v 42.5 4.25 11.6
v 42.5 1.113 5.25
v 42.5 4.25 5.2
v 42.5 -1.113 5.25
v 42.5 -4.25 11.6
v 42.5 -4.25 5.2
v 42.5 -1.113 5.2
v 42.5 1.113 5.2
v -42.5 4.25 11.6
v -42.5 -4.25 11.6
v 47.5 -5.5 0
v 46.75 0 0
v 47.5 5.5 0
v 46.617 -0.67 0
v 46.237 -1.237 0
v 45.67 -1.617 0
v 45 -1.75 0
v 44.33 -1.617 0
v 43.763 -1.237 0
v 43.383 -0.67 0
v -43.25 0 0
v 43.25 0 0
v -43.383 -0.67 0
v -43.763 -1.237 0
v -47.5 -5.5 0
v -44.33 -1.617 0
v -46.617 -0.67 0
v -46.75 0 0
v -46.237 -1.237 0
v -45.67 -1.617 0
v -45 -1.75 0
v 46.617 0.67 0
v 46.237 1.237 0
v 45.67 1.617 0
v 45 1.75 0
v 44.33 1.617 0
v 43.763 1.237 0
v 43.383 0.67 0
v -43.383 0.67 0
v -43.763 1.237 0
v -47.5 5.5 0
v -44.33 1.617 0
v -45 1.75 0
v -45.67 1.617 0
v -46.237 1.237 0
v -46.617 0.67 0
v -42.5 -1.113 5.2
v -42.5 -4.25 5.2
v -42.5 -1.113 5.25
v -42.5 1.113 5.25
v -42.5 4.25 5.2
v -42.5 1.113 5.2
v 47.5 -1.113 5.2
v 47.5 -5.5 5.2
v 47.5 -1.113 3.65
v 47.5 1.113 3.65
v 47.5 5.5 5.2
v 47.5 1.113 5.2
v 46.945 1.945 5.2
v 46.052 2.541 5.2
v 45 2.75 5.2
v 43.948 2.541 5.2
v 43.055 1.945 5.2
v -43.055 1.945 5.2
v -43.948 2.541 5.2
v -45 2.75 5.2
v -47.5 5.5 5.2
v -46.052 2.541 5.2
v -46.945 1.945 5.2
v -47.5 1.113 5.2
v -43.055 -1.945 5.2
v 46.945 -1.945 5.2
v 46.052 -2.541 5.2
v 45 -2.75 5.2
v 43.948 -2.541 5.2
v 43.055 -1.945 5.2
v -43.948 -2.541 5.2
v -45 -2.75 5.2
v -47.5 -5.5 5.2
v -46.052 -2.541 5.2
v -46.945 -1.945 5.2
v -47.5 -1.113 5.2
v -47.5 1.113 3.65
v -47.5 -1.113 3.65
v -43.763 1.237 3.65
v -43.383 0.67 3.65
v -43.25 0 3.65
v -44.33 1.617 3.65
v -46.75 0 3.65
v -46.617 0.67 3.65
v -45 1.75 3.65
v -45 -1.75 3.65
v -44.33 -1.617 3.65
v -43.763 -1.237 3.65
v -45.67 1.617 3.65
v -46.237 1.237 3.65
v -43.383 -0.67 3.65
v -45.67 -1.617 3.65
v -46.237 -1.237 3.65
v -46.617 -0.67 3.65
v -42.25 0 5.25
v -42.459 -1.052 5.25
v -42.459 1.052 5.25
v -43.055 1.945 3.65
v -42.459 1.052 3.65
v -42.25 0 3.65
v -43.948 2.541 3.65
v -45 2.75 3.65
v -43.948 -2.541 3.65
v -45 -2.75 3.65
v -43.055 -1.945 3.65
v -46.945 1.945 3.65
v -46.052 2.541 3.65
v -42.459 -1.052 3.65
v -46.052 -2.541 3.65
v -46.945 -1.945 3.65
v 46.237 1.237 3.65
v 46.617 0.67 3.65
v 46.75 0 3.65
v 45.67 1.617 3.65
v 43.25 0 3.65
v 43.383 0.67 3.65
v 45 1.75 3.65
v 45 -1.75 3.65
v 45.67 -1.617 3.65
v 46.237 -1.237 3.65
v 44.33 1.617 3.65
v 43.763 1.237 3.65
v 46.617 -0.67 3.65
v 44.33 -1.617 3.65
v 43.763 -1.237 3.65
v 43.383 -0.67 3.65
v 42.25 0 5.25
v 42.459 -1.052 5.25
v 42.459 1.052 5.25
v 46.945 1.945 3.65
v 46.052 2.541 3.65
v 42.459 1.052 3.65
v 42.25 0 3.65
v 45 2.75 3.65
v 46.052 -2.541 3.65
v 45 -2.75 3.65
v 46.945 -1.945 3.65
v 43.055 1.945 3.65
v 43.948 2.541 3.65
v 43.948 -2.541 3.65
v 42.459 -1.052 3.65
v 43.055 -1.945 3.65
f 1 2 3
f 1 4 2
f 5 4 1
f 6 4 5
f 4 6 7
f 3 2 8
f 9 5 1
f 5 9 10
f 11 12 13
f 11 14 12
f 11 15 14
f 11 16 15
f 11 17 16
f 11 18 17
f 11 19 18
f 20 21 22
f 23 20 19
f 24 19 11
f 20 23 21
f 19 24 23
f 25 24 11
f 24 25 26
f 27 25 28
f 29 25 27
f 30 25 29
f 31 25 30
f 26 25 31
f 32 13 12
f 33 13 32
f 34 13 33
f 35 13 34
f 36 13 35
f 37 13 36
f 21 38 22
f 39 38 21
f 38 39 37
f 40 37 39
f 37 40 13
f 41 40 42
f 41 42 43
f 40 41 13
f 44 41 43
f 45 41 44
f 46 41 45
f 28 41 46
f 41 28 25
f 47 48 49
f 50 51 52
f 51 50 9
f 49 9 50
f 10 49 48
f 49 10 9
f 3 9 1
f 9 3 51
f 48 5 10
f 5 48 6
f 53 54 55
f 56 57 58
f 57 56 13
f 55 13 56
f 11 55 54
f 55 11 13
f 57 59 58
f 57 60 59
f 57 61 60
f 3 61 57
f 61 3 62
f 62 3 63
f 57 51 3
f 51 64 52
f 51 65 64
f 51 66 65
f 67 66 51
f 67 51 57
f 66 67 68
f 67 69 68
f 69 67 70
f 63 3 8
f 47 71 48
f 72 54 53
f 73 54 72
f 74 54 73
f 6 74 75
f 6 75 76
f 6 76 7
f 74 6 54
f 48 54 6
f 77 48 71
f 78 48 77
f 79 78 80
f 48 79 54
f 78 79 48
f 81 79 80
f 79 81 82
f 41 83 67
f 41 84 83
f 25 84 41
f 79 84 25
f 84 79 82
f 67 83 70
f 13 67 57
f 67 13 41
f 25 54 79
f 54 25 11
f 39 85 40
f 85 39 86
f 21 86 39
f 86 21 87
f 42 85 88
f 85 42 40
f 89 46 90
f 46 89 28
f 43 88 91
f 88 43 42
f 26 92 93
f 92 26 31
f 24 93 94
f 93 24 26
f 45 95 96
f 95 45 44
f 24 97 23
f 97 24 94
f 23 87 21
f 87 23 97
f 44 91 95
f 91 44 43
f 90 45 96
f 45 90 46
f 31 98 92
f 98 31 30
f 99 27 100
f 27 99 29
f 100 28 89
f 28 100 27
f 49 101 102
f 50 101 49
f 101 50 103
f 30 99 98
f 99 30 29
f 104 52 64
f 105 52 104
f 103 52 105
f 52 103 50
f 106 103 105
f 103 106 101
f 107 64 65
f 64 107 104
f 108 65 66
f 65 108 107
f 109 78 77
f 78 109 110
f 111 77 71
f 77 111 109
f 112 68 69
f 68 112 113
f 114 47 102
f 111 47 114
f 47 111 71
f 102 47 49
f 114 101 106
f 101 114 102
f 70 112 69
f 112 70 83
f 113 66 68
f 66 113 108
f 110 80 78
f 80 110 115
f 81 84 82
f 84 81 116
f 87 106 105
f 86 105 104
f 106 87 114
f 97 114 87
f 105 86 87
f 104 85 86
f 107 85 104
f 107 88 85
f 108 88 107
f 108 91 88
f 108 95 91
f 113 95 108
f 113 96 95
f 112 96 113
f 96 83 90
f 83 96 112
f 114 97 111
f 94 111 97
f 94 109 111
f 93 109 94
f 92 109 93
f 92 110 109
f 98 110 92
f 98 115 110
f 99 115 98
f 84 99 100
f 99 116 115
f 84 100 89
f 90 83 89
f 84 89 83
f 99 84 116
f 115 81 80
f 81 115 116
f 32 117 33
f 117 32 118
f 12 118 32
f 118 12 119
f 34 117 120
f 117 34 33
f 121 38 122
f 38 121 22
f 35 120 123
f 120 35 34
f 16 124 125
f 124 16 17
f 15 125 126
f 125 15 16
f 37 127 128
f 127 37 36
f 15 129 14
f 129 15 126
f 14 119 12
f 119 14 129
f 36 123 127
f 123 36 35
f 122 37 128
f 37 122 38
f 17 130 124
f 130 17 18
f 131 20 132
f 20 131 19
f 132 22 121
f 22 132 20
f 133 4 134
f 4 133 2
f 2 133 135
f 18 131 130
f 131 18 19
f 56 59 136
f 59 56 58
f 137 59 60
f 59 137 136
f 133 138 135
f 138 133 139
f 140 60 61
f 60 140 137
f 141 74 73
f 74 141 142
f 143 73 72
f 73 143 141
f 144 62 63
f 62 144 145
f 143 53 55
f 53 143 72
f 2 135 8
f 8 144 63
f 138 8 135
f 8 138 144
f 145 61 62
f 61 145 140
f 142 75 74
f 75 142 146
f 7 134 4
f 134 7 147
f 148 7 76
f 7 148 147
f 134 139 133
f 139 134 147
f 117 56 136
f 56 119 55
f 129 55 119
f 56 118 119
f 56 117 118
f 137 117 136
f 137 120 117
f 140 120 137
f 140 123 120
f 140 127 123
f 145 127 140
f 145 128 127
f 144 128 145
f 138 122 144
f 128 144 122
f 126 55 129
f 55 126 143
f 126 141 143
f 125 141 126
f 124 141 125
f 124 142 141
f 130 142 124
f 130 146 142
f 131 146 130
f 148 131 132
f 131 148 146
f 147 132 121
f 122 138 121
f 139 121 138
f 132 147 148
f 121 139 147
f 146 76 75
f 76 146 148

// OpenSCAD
// file: ../linurs/linurs_screw_dim.scad
// Metric screws and nuts 
// urs@linurs.org

// contains dimensions of linurs_screw and can be included in other 
// OpenScad files 

// Parameters in this file
// d screw diameter M2_5, M3, ... (enumeration with screw_d)
// t millimeters added to diameters 

// enumerations of metric threads
M2_5=0;
M3=1;
M4=2;
M5=3;

// enumerations screw head type
head_cyl=0; // cylinder
head_cnt=1; // countrsunk
head_no=2;  // no head at all
head_hex=3;  // no head at all

// screw diameters
screw_d=[
2.5, // M2.5
3.0, // M3
4.0, // M4
5.0  // M5
];

// sizes for hex nuts
screw_hex=[
//   s,   e,   h
 [ 5.0, 5.8, 1.7], // M2.5
 [ 5.5, 6.4, 2.0], // M3
 [ 7.0, 8.1, 2.8], // M4
 [ 8.0, 9.2, 3.5]  // M5
];

// sizes for cylinder screw heads
screw_cyl=[
//   d,   h
 [ 4.5, 1.6], // M2.5
 [ 5.5, 2.0], // M3
 [ 7.0, 2.6], // M4
 [ 8.5, 3.3]  // M5
];

// sizes for countersunk screw heads
screw_cnt=[
//   d,   h
 [ 4.7, 1.50], // M2.5
 [ 5.6, 1.65], // M3
 [ 7.4, 2.20], // M4
 [ 9.2, 2.50]  // M5
];
// file: ../linurs/linurs_screw.scad
// Metric screws and nuts 
// urs@linurs.org 2019
// It is targeted for 3D printing applications. 
// To look realistic is not the goal (Example: Nuts do not have a hole)

include <linurs_screw_dim.scad>

d=0; //[0:M2_5,1:M3,2:M4,3:M5]
type=0;//[0:head_cyl,1:head_cnt,2:head_no,3:head_hex]
w=15; 
i=10;
nut_sink=0;
screw_sink=0; 
t=0.01;
fn=16;

/* [hex_bolt] */
show_hex_bolt=false;

/* [nut] */
show_nut=false;

/* [screw] */
show_screw=false;

/* [screw_fix] */
show_screw_fix=false;

/* [screw_cut] */
show_screw_cut=false;

/* [nut_cut] */
show_nut_cut=false;
wi=0; 
rot=false;

// functions used multiple times to position nuts and heads
function headh_cyl(d)=screw_cyl[d][1];  // height of cyl screw head
function headh_cnt(d)=screw_cyl[d][1];  // height of cnt screw head
function headh(d,type=head_cyl)=(type==head_cyl ? headh_cyl(d) : (type==head_cnt ? headh_cnt(d) : 0 )); // height of screw head 

function nuth(d)=screw_hex[d][2];   // height of hex nut

// head of a cylinder screw
module screw_head_cyl(d=M3, t=0)
{
  screwhd=screw_cyl[d][0]+t; // diameter of cylinder screw head
  cylinder(d=screwhd,h=headh(d=d, type=head_cyl), center=true,$fn=16); // screw head
}

// head of a countersunk screw
module screw_head_cnt(d=M3, t=0)
{
  screwd=screw_d[d]+t; 
  screwhd=screw_cnt[d][0]+t; // diameter of cylinder screw head
  cylinder(d1=screwd,d2=screwhd,h=headh(d=d,type=head_cnt), center=true,$fn=16); // screw head
}

// head of a hex screw
module screw_head_hex(d=M3, t=0)
{
    translate([0,0,-nuth(d)/2])nut(d=d, t=t);
}

// head of all screws
module screw_head(d=M3, type=head_cyl, t=0)
{ 
  if(type==head_cnt){
    screw_head_cnt(d=d, t=t);
  } else {
    if(type==head_cyl){
      screw_head_cyl(d=d, t=t);
    } else {
       if(type==head_hex){
           screw_head_hex(d=d, t=t); 
       } 
    }    
  }
}

// hex bolt 
module hex_bolt(d=M3, w=10, t=0)
{
  nutd=screw_hex[d][1]+t; // outer diameter of hex bolt
  cylinder(r=nutd/2,h=w+t, center=true,$fn=6); // nut
}

// nut 
module nut(d=M3, t=0)
{
  hex_bolt(d=d, w=nuth(d), t=t);    
}

// screw 
// w outer width of the screw = screw length + head 
module screw(w=10, d=M3, type=head_cyl, t=0){
  screwd=screw_d[d]+t;       // screw diameter
  cylinder(d=screwd, h=w, center=true,$fn=16); // screw thread length
  translate([0,0,w/2-headh(d=d,type=type)/2])
  screw_head(d=d,type=type, t=t);
}

// screw fix
// w outer width of the screw = screw length + head 
// sink additional material below to remove 
// raise additional material above to remove
module screw_fix(w=10, d=M3, type=head_cyl, screw_sink=0, nut_sink=0, t=0){
  screw(w=w, d=d, type=type, t=t);
  translate([0,0,-w/2+nuth(d)/2])
    nut(d=d,t=t);
  //additional material to be removed above the nut  
  translate([0,0,-(w+nut_sink)/2])hex_bolt(d=d,w=nut_sink+0.01,t=t);    
  //additional material to be removed above the screw head
  if(type==head_cnt){  
    translate([0,0,w/2+screw_sink])
    cylinder(d=screw_cnt[d][0]+t,h=screw_sink+0.01,center=true,$fn=16);
  }else{ 
    translate([0,0,(w+screw_sink)/2])
    cylinder(d=screw_cyl[d][0]+t,h=screw_sink+0.01,center=true,$fn=16);
  }     
}

// screw cut
// material to be extracted from object to slide in a counter sunk screw for fixation
// w height of the cut out
// i depth of the screw
module screw_cut(d=M3,w=20,i=10,t=0,fn=32){
    hsh=screw_cnt[d][1];
    ws=screw_cnt[d][0]+t;
    ds=screw_d[d]+t;
    
    translate([i/2,0,-(w-hsh)/2])
      cube([i,ws,hsh],center=true);
    
    translate([0,0,-(w-hsh)/2])
      cylinder(d=ws,h=hsh,center=true,$fn=32);
    
    translate([0,0,-(w-hsh)/2+hsh])
        cylinder(d2=ds, d1=ws, h=hsh,center=true,$fn=fn);
    
    cylinder(h=w, d=ds, center=true, $fn=fn);   
    
    translate([i/2,0,0]) 
        cube([i,ds,w],center=true);
    
    for(y=[-1,1]){
        translate([i/2,y*ds/2,-w/2+hsh])
            rotate([45,0,0])
            cube([i,sqrt(2)*(ws-ds)/2,sqrt(2)*(ws-ds)/2],center=true);
    }
}
//screw_cut();

// nut cut
// material to be extracted from object to slide in a nut for fixation
// w height of the cylinder
// i lenght of the inlet
module nut_cut(w=10, wi=0, d=M3, i=10, t=0, rot=false,type=head_cyl){ 
  r=(rot)?90:0;
  ds=(rot)?screw_hex[d][1]:screw_hex[d][0];
  rotate([0,0,r])nut(d,t);
  translate([i/2,0,0])
    cube([i,ds+t,nuth(d)+t],center=true);
  translate([0,0,-wi])
      if(type==head_cnt){    
          screw(w=w, d=d, type=type, t=t); 
        translate([0,0,w/2])
          cylinder(d=screw_cnt[d][0]+t,h=raise,center=true,$fn=16);
      }
      else{ 
          screw(w=w, d=d, type=type, t=t);   
  //      translate([0,0,0])
          //#cylinder(d=screw_cyl[d][0]+t,h=w,center=true,$fn=16);
      }       
}

if(show_hex_bolt==true){
   hex_bolt(d=d, w=w, t=t);
}

if(show_nut==true){
  nut(d=d, t=t);
}    

if(show_screw==true){
   screw(w=w, d=d, type=type, t=t);
}

if(show_screw_fix==true){
  screw_fix(w=w, d=d, type=type, nut_sink=nut_sink, screw_sink=screw_sink, t=t);
}

if(show_screw_cut==true){
  screw_cut(d=d,w=w,i=i,t=t,$fn=fn);
}    

if(show_nut_cut==true){
  nut_cut(w=w, wi=wi, d=d, i=i, t=t,rot=rot,type=type);
}  
// file: din41612_female_dim.scad
include <../linurs/linurs_screw_dim.scad>

// connector dimensions
din41612_female_l=95;       // lenght of the connector
din41612_female_l1=85;      // lenght of the connector head
din41612_female_h=11.6;     // height of the connector
din41612_female_h1=5.2;     // height produced by the connector when pulgged in 
din41612_female_w=11;       // width of the connector
din41612_female_w1=8.5;     // width of the connector head

din41612_female_dl=90;      // distance between mounting holes
// main file
// din41612 female connector
// =========================

include <din41612_female_dim.scad>

use <../linurs/linurs_screw.scad>

type=true;
// type=true as it is
// type=false upper part removed to not conflict with male connector 
module din41612_female(type=0){ 
   // color("LightGrey")
  difference(){
    union(){
      if(type==true){  
        translate([0,0,din41612_female_h/2])
          cube([din41612_female_l1,
              din41612_female_w1,
              din41612_female_h],
              center=true);  // upper part down to board level
      }    
      translate([0,0,din41612_female_h1/2])
        cube([din41612_female_l,
              din41612_female_w,
              din41612_female_h1],
              center=true); // lower part laying on the board  

    }
    for(i=[-1,1]){ // mounting holes
      translate([i*din41612_female_dl/2,
                 0, 
                 din41612_female_h1/2])
      screw(w=din41612_female_h1+0.1, 
            d=M2_5, 
            type=head_cyl, 
            t=1);
    }
  }
}

din41612_female(type=type);  
